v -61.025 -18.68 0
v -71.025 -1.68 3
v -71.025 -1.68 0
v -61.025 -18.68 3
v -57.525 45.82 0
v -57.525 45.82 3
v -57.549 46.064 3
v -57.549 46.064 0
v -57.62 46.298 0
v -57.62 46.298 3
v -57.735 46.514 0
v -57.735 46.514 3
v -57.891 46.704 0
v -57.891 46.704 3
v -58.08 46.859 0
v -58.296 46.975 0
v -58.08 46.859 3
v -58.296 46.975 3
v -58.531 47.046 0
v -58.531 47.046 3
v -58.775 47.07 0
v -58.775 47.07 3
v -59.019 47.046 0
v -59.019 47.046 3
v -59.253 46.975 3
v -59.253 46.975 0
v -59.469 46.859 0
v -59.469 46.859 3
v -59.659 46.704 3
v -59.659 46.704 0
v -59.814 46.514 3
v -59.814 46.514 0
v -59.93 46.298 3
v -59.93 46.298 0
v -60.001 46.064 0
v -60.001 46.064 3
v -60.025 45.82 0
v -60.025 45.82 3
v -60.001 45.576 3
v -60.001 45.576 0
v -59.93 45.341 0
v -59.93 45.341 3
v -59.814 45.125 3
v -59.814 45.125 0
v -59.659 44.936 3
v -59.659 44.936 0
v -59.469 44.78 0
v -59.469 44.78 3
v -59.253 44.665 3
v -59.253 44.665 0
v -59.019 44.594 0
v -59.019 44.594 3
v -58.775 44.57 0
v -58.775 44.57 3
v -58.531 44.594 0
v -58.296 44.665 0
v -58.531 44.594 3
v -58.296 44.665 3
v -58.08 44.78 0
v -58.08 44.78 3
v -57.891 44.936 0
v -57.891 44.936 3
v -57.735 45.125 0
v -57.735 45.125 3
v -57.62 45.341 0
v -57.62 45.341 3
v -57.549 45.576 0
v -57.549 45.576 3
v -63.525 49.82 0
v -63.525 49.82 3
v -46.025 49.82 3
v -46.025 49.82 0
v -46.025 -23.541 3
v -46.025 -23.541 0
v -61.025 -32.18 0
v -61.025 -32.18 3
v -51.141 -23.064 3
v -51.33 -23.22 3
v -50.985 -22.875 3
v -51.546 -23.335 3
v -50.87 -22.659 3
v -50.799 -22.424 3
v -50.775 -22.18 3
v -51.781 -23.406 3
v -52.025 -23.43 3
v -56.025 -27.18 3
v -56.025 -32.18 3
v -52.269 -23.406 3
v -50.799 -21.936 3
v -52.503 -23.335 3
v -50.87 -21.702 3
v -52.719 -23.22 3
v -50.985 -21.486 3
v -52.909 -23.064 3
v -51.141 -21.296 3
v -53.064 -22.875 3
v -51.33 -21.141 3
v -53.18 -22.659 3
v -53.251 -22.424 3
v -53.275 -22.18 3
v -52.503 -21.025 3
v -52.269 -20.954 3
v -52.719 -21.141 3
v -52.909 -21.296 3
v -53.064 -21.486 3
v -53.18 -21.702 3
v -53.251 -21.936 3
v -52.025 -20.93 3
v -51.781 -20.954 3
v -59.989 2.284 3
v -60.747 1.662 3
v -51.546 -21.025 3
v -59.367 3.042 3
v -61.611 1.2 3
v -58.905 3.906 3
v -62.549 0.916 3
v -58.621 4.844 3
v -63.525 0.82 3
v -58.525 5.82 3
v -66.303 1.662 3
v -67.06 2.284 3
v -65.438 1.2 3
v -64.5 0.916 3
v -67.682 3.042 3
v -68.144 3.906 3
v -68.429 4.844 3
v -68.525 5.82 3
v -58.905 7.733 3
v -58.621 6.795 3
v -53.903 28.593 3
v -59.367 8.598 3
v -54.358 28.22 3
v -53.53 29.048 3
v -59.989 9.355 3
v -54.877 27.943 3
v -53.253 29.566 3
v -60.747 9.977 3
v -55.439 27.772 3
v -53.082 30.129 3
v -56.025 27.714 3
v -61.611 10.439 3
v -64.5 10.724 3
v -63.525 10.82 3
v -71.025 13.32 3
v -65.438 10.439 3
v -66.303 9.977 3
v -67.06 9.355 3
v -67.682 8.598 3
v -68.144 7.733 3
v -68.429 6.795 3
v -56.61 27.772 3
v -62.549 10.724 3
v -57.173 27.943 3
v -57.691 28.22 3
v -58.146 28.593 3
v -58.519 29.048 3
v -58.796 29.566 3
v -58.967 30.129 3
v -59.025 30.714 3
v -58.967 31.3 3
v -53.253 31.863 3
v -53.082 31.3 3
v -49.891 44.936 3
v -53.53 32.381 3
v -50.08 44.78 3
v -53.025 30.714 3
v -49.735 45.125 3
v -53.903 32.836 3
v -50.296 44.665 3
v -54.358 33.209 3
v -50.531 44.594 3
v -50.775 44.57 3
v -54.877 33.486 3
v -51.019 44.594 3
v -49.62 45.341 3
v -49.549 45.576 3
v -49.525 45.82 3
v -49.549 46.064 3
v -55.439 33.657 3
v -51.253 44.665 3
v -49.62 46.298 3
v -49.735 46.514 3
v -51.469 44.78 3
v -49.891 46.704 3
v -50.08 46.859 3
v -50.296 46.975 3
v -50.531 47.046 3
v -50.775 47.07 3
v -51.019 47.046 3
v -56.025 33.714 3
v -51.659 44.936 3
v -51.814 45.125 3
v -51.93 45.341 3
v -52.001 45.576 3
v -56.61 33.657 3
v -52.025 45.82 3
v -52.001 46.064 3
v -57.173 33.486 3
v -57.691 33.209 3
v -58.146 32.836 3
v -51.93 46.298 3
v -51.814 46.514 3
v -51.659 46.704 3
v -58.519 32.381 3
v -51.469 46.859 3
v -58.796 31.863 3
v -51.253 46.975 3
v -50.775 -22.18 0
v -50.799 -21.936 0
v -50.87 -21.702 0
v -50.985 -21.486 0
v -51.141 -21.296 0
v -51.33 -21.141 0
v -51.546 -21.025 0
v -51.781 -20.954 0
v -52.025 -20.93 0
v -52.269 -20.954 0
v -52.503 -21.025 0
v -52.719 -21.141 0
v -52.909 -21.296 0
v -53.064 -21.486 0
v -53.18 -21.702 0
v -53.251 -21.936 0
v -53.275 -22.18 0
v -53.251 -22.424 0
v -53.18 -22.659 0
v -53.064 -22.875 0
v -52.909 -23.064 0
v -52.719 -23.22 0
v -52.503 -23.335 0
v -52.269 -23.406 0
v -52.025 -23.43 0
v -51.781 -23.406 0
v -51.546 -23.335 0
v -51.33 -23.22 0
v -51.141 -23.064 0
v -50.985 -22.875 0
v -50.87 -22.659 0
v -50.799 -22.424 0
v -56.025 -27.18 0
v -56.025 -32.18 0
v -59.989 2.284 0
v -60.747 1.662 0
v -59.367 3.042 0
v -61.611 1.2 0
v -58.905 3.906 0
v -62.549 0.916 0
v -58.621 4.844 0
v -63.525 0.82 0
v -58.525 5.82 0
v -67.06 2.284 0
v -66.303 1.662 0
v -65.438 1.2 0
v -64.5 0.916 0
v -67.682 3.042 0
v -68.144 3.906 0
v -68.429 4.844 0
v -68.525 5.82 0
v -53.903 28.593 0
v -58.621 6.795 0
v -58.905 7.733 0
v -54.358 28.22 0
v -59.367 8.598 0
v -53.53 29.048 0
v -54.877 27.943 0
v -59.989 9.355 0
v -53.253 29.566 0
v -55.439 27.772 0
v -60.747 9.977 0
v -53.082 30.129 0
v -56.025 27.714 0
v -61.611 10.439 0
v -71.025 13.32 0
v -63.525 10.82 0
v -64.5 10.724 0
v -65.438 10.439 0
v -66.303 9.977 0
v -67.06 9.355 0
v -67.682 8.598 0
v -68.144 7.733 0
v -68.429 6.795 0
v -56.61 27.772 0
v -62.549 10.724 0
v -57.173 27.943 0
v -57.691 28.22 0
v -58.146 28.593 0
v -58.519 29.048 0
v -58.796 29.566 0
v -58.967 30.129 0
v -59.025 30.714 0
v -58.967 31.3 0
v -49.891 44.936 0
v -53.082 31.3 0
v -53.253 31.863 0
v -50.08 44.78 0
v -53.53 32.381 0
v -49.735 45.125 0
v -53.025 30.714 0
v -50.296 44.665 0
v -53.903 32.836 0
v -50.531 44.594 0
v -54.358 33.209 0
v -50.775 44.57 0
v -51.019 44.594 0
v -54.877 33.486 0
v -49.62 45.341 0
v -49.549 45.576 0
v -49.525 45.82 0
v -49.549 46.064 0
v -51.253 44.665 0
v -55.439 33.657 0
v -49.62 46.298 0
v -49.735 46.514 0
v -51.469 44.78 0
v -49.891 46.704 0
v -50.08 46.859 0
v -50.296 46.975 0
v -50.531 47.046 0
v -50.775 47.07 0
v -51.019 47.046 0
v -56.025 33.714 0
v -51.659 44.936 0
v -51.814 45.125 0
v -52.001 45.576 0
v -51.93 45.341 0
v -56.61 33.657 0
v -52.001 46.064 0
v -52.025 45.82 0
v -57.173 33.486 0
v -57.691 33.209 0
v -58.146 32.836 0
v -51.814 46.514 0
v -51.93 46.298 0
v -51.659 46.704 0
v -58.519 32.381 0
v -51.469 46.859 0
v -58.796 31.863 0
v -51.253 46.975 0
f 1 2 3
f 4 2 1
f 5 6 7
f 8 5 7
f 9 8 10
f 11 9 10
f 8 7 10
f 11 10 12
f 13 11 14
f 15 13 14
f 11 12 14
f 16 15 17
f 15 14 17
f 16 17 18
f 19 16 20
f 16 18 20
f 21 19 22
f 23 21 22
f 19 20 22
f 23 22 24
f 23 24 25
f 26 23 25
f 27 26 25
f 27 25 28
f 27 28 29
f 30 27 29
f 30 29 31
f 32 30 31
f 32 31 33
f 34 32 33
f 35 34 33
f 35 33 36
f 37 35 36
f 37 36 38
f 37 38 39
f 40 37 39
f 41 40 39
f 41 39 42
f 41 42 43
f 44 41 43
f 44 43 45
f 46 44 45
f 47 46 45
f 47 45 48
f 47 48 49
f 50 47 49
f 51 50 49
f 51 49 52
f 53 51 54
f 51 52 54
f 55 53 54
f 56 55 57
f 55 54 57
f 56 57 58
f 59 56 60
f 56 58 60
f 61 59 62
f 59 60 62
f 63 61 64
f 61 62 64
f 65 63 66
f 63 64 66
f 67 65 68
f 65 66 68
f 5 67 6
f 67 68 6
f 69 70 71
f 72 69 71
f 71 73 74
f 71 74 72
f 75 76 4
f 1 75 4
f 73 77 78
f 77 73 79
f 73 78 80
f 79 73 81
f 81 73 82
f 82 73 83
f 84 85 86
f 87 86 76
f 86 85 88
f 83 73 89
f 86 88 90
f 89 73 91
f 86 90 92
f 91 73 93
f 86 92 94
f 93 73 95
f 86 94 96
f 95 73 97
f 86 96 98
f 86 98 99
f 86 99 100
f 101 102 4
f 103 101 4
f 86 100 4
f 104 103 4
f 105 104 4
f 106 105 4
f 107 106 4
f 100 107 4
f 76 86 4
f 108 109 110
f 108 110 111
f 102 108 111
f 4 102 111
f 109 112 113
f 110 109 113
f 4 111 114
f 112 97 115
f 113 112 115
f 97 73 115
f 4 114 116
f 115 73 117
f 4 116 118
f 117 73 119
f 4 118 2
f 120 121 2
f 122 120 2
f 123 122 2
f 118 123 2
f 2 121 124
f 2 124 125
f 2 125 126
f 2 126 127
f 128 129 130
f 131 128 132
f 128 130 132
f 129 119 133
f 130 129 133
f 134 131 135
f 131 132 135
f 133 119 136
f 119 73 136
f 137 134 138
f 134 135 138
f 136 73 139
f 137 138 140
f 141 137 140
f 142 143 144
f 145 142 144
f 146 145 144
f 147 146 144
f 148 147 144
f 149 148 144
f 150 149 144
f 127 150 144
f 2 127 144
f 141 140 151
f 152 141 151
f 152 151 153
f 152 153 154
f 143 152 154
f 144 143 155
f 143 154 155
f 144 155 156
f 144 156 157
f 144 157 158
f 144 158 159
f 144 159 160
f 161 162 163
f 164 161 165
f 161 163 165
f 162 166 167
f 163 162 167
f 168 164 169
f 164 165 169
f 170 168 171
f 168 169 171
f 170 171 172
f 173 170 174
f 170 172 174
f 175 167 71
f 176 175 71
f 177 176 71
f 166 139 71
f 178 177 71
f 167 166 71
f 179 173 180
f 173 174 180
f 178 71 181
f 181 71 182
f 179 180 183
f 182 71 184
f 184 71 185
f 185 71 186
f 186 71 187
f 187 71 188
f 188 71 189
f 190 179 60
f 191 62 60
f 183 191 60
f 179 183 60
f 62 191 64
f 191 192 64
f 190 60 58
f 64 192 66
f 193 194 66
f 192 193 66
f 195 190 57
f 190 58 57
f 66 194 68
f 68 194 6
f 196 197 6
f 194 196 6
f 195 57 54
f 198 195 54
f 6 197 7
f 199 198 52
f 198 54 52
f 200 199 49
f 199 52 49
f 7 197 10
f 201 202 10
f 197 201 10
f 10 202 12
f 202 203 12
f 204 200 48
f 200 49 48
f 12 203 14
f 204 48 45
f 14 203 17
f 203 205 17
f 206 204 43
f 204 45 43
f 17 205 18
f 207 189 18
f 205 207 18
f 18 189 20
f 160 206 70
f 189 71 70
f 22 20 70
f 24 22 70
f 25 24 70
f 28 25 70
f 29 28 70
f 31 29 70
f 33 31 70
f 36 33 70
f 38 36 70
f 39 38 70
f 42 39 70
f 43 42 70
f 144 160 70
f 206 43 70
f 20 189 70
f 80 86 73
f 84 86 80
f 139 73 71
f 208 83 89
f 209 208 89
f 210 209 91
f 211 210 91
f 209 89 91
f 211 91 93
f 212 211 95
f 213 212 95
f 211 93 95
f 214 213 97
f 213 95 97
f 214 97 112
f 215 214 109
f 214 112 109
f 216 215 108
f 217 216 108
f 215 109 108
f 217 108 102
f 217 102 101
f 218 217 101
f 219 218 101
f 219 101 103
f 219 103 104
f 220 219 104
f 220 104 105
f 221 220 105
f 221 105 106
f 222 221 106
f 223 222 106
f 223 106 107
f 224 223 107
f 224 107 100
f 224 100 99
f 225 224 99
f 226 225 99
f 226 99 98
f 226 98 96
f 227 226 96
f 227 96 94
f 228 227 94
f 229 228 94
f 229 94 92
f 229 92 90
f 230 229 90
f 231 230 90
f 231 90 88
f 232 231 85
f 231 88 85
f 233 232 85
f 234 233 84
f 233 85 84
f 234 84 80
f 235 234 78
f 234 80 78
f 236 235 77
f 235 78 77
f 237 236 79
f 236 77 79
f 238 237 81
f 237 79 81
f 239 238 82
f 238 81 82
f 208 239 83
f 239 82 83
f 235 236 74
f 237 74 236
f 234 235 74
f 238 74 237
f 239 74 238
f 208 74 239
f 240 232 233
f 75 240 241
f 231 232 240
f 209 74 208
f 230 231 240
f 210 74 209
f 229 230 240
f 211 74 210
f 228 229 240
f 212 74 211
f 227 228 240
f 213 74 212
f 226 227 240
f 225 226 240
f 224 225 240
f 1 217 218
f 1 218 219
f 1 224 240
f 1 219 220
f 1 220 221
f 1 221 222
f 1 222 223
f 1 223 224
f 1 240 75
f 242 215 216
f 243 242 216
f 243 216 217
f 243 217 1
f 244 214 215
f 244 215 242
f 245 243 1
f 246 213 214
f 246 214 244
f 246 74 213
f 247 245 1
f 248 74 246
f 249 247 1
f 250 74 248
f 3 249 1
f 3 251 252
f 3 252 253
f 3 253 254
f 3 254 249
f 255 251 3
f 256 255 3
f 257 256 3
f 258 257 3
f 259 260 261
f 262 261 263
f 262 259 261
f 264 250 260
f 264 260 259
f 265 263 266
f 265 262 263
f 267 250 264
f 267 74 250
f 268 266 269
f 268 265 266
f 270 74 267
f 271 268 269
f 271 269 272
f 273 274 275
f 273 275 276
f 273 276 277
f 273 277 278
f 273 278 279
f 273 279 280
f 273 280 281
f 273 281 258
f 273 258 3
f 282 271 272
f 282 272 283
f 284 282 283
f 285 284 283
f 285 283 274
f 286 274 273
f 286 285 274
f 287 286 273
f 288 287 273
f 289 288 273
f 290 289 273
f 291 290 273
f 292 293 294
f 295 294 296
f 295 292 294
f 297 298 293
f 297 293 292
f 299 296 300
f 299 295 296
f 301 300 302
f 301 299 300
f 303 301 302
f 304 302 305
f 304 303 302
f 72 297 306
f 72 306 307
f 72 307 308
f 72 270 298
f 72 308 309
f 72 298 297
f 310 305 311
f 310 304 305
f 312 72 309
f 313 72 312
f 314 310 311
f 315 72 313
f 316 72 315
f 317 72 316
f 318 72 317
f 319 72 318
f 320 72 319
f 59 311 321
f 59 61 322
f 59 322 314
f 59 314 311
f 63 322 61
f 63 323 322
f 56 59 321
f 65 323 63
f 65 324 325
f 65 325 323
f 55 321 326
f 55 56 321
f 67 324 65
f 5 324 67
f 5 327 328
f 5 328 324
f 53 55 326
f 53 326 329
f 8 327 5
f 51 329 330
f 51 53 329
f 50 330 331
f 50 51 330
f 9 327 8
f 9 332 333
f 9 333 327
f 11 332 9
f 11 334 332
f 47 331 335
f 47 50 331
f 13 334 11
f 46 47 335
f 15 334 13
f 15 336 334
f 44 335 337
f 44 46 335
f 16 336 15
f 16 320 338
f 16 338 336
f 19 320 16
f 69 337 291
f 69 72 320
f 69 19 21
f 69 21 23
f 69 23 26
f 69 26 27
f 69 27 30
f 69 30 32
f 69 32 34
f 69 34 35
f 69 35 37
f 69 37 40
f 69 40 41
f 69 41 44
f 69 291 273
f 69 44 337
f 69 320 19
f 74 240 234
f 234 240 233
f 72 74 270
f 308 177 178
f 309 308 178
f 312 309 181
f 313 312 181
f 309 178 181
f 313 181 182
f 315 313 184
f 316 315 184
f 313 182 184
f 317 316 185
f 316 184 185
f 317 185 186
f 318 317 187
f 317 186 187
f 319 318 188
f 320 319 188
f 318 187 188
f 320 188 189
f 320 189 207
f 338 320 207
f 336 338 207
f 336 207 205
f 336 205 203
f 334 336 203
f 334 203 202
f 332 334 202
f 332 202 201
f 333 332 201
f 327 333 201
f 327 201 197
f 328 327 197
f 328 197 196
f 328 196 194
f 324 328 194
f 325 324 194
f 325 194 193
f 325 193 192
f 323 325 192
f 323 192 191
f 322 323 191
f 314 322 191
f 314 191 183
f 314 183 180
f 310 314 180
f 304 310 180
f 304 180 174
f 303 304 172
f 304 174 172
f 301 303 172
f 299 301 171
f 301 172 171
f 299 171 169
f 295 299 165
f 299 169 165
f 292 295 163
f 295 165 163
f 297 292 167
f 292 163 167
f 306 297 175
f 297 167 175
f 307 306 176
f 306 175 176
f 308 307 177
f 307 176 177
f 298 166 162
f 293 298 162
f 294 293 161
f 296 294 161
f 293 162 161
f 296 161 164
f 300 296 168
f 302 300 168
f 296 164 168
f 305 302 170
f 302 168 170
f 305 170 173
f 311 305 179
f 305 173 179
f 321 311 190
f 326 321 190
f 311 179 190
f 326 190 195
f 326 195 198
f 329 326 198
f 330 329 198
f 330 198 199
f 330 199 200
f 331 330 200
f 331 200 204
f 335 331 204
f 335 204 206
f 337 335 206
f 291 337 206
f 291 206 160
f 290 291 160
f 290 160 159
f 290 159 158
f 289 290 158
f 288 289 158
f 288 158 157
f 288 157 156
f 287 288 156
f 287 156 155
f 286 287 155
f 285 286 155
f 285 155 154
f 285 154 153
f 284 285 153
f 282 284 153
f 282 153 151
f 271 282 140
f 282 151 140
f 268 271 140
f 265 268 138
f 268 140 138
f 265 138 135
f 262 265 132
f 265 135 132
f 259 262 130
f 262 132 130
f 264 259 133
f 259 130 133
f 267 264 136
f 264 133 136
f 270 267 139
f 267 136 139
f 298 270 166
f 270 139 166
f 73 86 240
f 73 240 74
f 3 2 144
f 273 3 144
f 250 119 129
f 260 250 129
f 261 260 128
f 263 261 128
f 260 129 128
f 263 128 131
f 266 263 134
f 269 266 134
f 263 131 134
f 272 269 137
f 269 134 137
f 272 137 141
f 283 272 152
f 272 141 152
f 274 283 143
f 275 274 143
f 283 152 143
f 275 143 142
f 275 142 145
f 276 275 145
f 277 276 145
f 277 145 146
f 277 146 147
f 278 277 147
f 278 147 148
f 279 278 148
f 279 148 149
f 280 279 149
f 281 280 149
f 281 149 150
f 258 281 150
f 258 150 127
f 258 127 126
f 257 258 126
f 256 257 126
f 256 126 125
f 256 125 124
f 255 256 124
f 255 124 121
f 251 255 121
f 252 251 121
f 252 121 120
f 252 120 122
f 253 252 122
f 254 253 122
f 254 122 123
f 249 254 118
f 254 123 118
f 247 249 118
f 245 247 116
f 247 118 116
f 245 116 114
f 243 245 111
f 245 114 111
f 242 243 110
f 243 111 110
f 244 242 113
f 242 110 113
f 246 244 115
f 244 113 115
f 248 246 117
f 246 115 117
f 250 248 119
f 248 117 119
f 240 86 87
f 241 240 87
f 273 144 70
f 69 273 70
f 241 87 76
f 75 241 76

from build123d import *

# Parameters (mm, degrees)
SKETCH2_W           = 20
SKETCH2_H           = 77
BOSS_EXTRUDE1_DEPTH = 3
SKETCH3_W           = 15
SKETCH3_H           = 15
BOSS_EXTRUDE2_DEPTH = 3
BOSS_EXTRUDE3_DEPTH = 3
BOSS_EXTRUDE4_DEPTH = 3
SKETCH6_R           = 5
SKETCH6_R_2         = 3
SKETCH6_R_3         = 1.25
CUT_EXTRUDE1_DEPTH  = 4
SKETCH7_R           = 1.25
CUT_EXTRUDE2_DEPTH  = 10


with BuildPart() as part:
    # Sketch2 → Boss-Extrude1 (new body)
    with BuildSketch(Plane.XY):
        with Locations((-46.024750416, 11.319675541)):
            Rectangle(SKETCH2_W, SKETCH2_H)
    extrude(amount=BOSS_EXTRUDE1_DEPTH)

    # Sketch3 → Boss-Extrude2 (add)
    with BuildSketch(Plane.XY.offset(3)):
        with Locations((-63.524750416, 5.819675541)):
            Rectangle(SKETCH3_W, SKETCH3_H)
    extrude(amount=-BOSS_EXTRUDE2_DEPTH)

    # Sketch4 → Boss-Extrude3 (add)
    with BuildSketch(Plane.XY.offset(3)):
        Polygon((-71.024750416, 13.319675541), (-63.524750416, 49.819675541), (-56.024750416, 49.819675541), (-56.024750416, 13.319675541), align=None)
        Polygon((-71.024750416, -1.680324459), (-56.024750416, -27.180324459), (-56.024750416, -1.680324459), align=None)
    extrude(amount=-BOSS_EXTRUDE3_DEPTH)

    # Sketch5 → Boss-Extrude4 (add)
    with BuildSketch(Plane.XY.offset(3)):
        Polygon((-56.024750416, -27.180324459), (-56.024750416, -32.180324459), (-61.024750416, -32.180324459), (-61.024750416, -18.680324459), align=None)
    extrude(amount=-BOSS_EXTRUDE4_DEPTH)

    # Sketch6 → Cut-Extrude1 (cut, through all)
    with BuildSketch(Plane.XY.offset(3)):
        with Locations((-63.524750416, 5.819675541)):
            Circle(SKETCH6_R)
        with Locations((-56.024750416, 30.71445411)):
            Circle(SKETCH6_R_2)
        with Locations((-52.024750416, -22.180324459)):
            Circle(SKETCH6_R_3)
        Polygon((-56.024750416, -27.180324459), (-46.024750416, -23.540622117), (-46.024750416, 49.819675541), (-36.024750416, 49.819675541), (-36.024750416, -27.180324459), (-46.024750416, -27.180324459), align=None)
    extrude(amount=-CUT_EXTRUDE1_DEPTH, mode=Mode.SUBTRACT)

    # Sketch7 → Cut-Extrude2 (cut)
    with BuildSketch(Plane.XY.offset(3)):
        with Locations((-58.774750416, 45.819675541)):
            Circle(SKETCH7_R)
        with Locations((-50.774750416, 45.819675541)):
            Circle(SKETCH7_R)
    extrude(amount=-CUT_EXTRUDE2_DEPTH, mode=Mode.SUBTRACT)


solid = part.part
